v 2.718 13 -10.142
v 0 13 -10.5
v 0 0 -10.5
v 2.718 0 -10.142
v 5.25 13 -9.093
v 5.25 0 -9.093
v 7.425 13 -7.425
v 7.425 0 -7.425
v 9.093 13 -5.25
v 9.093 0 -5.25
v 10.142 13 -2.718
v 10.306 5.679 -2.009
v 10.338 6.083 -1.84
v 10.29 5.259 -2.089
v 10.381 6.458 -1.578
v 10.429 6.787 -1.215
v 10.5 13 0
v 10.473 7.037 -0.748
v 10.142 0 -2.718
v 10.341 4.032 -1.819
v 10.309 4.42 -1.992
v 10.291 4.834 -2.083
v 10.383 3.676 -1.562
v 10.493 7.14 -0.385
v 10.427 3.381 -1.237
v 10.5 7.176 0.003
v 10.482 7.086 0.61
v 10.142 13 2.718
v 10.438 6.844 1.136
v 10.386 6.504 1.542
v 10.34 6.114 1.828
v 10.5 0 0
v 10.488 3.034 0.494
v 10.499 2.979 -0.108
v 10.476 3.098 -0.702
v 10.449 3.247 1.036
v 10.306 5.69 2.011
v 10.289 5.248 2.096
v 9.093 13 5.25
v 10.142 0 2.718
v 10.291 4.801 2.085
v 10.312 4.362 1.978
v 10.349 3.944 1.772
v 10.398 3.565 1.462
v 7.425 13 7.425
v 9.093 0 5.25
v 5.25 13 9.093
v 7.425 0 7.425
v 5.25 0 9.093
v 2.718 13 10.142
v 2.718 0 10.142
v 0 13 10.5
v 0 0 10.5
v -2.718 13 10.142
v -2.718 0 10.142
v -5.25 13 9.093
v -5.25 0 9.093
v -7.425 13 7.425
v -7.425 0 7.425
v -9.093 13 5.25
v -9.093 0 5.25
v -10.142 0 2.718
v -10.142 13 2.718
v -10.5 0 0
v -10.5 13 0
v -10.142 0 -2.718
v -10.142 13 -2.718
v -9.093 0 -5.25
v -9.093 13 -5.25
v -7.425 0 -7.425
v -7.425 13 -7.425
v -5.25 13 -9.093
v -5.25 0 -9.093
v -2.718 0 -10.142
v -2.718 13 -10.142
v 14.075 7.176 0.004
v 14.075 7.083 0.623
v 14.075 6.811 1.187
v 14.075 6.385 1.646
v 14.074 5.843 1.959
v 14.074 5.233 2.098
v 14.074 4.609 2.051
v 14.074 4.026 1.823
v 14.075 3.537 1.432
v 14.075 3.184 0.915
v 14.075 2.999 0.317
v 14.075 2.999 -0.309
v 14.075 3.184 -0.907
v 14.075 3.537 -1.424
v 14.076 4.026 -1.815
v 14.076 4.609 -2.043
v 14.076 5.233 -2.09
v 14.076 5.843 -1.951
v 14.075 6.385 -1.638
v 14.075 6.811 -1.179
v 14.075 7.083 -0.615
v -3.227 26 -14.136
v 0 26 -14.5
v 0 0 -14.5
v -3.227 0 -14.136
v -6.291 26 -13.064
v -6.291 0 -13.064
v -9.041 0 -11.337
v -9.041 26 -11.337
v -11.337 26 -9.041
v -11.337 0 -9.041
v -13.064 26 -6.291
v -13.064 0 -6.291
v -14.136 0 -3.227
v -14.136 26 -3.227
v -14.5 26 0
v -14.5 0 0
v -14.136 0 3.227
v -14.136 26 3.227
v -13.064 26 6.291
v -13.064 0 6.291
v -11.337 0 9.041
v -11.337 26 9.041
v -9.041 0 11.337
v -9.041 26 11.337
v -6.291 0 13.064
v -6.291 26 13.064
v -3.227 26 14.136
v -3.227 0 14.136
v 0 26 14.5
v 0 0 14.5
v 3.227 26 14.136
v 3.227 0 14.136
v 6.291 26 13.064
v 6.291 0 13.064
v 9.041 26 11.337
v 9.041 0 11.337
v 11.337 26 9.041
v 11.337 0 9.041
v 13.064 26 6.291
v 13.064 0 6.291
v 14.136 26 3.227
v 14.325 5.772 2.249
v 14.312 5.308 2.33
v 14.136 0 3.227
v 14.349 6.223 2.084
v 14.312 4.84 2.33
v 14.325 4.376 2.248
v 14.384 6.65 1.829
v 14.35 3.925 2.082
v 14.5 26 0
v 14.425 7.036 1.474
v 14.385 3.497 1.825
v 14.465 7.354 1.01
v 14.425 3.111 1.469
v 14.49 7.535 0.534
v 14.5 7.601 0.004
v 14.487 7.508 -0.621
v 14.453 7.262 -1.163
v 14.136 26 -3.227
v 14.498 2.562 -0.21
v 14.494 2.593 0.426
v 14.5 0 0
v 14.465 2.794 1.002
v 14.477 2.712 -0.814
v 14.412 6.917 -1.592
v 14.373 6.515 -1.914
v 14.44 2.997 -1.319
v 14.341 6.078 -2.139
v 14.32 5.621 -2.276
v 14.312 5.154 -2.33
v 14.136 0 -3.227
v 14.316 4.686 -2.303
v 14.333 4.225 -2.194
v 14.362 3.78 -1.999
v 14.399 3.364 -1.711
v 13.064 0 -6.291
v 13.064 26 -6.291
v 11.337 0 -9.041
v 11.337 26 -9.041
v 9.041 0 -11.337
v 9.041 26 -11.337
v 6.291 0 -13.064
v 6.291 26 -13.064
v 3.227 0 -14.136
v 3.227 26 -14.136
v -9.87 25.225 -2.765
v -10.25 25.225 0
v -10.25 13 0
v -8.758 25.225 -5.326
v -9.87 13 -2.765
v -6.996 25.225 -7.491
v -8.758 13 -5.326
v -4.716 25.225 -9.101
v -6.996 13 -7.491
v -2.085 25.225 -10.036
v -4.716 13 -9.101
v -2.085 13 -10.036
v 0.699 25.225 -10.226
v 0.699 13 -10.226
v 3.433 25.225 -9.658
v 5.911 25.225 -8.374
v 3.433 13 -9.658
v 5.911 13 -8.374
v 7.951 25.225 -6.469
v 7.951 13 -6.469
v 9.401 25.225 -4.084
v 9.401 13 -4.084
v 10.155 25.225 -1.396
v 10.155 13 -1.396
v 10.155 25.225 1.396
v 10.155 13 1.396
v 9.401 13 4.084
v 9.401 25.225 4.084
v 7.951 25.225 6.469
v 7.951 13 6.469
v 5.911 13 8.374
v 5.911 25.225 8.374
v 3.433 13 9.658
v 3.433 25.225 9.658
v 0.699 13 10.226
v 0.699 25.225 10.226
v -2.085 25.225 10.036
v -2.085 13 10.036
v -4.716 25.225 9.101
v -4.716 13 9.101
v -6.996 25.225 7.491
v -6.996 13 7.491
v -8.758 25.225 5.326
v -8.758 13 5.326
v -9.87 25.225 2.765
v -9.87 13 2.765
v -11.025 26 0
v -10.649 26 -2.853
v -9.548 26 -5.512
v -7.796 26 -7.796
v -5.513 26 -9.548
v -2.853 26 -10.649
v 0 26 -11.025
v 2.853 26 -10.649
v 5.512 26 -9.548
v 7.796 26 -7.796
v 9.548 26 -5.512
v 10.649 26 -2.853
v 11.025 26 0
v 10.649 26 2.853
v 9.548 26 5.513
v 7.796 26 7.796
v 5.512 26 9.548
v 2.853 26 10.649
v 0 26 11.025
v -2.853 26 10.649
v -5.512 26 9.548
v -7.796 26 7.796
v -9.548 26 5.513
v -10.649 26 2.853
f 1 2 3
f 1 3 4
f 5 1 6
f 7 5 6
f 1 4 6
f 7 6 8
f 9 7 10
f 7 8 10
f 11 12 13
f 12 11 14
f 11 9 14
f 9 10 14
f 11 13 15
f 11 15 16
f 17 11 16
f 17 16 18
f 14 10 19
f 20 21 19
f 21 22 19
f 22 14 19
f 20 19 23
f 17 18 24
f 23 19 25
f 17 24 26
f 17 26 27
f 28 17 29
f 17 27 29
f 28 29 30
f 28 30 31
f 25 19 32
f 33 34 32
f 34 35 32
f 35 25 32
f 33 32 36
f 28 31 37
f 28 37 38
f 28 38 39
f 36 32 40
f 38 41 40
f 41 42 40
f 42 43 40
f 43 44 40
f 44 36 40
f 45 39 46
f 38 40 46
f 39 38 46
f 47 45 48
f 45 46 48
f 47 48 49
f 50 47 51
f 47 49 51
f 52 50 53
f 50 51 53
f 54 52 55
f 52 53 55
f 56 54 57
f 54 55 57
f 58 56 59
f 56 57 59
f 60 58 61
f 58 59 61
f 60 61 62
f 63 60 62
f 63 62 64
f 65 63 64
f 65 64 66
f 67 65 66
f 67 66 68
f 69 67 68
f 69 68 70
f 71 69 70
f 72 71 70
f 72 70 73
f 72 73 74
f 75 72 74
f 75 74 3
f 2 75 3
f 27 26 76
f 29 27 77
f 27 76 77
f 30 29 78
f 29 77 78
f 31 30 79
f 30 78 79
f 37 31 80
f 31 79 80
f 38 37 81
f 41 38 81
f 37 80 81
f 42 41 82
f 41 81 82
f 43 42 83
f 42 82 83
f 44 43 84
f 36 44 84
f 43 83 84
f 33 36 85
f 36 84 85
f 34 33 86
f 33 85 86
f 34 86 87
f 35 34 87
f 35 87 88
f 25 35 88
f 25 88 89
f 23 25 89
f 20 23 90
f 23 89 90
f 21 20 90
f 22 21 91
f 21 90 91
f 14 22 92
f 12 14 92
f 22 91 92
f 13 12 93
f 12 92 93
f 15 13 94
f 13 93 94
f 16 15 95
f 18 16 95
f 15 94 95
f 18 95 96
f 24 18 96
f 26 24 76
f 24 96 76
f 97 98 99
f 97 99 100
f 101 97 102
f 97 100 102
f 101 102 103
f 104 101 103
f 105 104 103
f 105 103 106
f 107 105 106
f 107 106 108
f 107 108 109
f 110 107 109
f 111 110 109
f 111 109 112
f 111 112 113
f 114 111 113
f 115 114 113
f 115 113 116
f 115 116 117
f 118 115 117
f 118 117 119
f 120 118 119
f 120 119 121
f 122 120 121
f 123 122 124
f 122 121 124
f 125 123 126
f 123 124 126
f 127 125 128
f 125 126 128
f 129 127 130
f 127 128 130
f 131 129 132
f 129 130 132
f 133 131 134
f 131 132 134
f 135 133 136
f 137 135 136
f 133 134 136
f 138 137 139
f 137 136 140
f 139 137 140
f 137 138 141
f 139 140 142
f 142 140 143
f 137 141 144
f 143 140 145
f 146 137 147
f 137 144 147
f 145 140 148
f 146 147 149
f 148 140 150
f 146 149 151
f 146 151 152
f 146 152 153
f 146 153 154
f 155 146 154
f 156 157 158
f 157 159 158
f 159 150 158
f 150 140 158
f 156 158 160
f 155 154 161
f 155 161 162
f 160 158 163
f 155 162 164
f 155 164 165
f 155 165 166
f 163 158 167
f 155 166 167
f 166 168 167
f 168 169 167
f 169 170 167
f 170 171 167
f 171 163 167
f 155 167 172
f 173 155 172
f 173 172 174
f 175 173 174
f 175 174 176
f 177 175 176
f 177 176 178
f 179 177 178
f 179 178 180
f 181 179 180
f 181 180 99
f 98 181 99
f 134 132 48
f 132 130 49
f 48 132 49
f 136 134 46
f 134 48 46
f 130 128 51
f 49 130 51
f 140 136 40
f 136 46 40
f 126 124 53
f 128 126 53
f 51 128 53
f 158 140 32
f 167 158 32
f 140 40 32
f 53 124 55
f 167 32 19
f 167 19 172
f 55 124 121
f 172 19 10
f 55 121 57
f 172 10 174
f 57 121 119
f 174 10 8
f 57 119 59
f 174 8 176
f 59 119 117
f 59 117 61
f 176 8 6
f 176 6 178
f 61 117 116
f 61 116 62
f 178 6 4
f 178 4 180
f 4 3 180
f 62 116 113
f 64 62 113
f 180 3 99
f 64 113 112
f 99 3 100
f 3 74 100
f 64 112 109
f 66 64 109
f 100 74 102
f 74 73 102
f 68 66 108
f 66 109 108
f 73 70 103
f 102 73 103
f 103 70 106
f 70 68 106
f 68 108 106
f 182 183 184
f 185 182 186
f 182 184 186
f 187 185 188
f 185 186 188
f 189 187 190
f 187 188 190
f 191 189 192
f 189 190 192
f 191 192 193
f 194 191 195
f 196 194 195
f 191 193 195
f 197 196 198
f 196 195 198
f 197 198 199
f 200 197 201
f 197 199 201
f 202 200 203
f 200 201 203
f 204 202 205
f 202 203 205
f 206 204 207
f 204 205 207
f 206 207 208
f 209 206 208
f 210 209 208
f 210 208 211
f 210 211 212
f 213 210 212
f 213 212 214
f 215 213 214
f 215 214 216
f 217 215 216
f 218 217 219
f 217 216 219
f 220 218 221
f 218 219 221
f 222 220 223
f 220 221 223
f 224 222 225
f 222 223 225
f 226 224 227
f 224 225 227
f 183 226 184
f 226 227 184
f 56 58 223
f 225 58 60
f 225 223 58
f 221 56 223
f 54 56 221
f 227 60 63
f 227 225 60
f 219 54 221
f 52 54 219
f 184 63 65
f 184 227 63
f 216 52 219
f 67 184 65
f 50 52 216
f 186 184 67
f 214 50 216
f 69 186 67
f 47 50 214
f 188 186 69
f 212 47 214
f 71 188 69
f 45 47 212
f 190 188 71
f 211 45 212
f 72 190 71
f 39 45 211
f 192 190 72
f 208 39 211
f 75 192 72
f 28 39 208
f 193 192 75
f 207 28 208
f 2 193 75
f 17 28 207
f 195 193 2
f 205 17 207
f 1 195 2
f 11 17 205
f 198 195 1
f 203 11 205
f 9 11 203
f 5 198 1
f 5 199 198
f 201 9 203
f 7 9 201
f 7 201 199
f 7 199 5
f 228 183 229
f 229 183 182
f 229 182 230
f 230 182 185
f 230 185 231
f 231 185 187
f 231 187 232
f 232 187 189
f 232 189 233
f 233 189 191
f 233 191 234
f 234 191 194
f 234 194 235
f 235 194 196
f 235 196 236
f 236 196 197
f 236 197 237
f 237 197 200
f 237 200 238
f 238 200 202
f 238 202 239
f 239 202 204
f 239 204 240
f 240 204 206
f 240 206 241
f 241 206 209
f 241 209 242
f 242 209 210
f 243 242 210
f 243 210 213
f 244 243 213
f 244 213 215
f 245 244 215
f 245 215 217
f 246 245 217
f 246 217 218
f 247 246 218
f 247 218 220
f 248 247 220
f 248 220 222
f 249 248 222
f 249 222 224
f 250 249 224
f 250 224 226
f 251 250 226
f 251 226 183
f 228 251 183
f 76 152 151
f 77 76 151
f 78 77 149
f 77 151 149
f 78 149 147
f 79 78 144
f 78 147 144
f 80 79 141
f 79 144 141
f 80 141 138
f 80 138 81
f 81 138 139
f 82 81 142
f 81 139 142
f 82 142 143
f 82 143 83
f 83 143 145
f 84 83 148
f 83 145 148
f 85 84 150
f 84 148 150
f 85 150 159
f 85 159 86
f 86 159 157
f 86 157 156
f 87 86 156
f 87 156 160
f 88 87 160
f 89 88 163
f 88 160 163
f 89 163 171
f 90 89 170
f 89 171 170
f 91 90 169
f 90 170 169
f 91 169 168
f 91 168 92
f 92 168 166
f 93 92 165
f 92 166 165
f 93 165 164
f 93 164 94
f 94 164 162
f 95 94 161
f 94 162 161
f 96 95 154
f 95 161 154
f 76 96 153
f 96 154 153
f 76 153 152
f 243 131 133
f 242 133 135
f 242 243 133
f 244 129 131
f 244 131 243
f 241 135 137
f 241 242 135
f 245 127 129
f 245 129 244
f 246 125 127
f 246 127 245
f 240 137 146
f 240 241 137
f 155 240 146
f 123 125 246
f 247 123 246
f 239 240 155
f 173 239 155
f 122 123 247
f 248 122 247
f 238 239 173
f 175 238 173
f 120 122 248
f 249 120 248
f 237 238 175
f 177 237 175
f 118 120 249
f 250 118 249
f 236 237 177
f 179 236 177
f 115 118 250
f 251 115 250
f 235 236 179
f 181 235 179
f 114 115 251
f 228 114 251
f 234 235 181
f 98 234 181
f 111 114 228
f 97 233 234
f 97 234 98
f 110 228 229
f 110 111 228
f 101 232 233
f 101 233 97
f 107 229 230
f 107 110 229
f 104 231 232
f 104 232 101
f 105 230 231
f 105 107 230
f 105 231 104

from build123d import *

# Parameters (mm, degrees)
ESBO_O1_R                            = 14.5
RESSALTO_EXTRUS_O1_DEPTH             = 26
ESBO_O2_R                            = 10.5
CORTE_EXTRUS_O2_DEPTH                = 13
FURO_ROSCADO_DE_M22X1_51_D           = 20.5
FURO_ROSCADO_DE_M22X1_51_CSINK_D     = 22.05
FURO_ROSCADO_DE_M22X1_51_CSINK_ANGLE = 90


# Read off the part's stored shape, not the designer's step: Furo roscado de M51
with BuildPart() as part:
    # Esboço1 → Ressalto-extrusão1 (new body)
    with BuildSketch(Plane(origin=(0, 0, 0), x_dir=(1, 0, 0), z_dir=(0, 1, 0))):
        with Locations(Location((0, 0, 0), (0, 0, 90))):
            Circle(ESBO_O1_R)
    extrude(amount=RESSALTO_EXTRUS_O1_DEPTH)

    # Esboço2 → Corte-extrusão2 (cut)
    with BuildSketch(Plane.XZ):
        with Locations(Location((0, 0, 0), (0, 0, 270))):
            Circle(ESBO_O2_R)
    extrude(amount=-CORTE_EXTRUS_O2_DEPTH, mode=Mode.SUBTRACT)

    # Furo roscado de M22x1.51 (through all)
    with Locations(Plane(origin=(0, 26, 0), x_dir=(1, 0, 0), z_dir=(0, 1, 0))):
        with Locations((0, 0)):
            CounterSinkHole(FURO_ROSCADO_DE_M22X1_51_D / 2, FURO_ROSCADO_DE_M22X1_51_CSINK_D / 2, counter_sink_angle=FURO_ROSCADO_DE_M22X1_51_CSINK_ANGLE)

    # Furo roscado de M51 outline → Furo roscado de M51 (revolve, cut)
    with BuildSketch(Plane(origin=(0, 5.075943164, 0), x_dir=(0, 1, 0), z_dir=(0.000288160587710413, 0, -0.999999958481737))):
        Polygon((2.525059426, 14.500059426), (0, 14.500059426), (0, 10.287739691), (2.1, 10.287739691), (2.1, 14.075), align=None)
    revolve(axis=Axis((0, 5.075943164, 0), (0.999999958481737, 0, 0.000288160587710413)), mode=Mode.SUBTRACT)


solid = part.part
